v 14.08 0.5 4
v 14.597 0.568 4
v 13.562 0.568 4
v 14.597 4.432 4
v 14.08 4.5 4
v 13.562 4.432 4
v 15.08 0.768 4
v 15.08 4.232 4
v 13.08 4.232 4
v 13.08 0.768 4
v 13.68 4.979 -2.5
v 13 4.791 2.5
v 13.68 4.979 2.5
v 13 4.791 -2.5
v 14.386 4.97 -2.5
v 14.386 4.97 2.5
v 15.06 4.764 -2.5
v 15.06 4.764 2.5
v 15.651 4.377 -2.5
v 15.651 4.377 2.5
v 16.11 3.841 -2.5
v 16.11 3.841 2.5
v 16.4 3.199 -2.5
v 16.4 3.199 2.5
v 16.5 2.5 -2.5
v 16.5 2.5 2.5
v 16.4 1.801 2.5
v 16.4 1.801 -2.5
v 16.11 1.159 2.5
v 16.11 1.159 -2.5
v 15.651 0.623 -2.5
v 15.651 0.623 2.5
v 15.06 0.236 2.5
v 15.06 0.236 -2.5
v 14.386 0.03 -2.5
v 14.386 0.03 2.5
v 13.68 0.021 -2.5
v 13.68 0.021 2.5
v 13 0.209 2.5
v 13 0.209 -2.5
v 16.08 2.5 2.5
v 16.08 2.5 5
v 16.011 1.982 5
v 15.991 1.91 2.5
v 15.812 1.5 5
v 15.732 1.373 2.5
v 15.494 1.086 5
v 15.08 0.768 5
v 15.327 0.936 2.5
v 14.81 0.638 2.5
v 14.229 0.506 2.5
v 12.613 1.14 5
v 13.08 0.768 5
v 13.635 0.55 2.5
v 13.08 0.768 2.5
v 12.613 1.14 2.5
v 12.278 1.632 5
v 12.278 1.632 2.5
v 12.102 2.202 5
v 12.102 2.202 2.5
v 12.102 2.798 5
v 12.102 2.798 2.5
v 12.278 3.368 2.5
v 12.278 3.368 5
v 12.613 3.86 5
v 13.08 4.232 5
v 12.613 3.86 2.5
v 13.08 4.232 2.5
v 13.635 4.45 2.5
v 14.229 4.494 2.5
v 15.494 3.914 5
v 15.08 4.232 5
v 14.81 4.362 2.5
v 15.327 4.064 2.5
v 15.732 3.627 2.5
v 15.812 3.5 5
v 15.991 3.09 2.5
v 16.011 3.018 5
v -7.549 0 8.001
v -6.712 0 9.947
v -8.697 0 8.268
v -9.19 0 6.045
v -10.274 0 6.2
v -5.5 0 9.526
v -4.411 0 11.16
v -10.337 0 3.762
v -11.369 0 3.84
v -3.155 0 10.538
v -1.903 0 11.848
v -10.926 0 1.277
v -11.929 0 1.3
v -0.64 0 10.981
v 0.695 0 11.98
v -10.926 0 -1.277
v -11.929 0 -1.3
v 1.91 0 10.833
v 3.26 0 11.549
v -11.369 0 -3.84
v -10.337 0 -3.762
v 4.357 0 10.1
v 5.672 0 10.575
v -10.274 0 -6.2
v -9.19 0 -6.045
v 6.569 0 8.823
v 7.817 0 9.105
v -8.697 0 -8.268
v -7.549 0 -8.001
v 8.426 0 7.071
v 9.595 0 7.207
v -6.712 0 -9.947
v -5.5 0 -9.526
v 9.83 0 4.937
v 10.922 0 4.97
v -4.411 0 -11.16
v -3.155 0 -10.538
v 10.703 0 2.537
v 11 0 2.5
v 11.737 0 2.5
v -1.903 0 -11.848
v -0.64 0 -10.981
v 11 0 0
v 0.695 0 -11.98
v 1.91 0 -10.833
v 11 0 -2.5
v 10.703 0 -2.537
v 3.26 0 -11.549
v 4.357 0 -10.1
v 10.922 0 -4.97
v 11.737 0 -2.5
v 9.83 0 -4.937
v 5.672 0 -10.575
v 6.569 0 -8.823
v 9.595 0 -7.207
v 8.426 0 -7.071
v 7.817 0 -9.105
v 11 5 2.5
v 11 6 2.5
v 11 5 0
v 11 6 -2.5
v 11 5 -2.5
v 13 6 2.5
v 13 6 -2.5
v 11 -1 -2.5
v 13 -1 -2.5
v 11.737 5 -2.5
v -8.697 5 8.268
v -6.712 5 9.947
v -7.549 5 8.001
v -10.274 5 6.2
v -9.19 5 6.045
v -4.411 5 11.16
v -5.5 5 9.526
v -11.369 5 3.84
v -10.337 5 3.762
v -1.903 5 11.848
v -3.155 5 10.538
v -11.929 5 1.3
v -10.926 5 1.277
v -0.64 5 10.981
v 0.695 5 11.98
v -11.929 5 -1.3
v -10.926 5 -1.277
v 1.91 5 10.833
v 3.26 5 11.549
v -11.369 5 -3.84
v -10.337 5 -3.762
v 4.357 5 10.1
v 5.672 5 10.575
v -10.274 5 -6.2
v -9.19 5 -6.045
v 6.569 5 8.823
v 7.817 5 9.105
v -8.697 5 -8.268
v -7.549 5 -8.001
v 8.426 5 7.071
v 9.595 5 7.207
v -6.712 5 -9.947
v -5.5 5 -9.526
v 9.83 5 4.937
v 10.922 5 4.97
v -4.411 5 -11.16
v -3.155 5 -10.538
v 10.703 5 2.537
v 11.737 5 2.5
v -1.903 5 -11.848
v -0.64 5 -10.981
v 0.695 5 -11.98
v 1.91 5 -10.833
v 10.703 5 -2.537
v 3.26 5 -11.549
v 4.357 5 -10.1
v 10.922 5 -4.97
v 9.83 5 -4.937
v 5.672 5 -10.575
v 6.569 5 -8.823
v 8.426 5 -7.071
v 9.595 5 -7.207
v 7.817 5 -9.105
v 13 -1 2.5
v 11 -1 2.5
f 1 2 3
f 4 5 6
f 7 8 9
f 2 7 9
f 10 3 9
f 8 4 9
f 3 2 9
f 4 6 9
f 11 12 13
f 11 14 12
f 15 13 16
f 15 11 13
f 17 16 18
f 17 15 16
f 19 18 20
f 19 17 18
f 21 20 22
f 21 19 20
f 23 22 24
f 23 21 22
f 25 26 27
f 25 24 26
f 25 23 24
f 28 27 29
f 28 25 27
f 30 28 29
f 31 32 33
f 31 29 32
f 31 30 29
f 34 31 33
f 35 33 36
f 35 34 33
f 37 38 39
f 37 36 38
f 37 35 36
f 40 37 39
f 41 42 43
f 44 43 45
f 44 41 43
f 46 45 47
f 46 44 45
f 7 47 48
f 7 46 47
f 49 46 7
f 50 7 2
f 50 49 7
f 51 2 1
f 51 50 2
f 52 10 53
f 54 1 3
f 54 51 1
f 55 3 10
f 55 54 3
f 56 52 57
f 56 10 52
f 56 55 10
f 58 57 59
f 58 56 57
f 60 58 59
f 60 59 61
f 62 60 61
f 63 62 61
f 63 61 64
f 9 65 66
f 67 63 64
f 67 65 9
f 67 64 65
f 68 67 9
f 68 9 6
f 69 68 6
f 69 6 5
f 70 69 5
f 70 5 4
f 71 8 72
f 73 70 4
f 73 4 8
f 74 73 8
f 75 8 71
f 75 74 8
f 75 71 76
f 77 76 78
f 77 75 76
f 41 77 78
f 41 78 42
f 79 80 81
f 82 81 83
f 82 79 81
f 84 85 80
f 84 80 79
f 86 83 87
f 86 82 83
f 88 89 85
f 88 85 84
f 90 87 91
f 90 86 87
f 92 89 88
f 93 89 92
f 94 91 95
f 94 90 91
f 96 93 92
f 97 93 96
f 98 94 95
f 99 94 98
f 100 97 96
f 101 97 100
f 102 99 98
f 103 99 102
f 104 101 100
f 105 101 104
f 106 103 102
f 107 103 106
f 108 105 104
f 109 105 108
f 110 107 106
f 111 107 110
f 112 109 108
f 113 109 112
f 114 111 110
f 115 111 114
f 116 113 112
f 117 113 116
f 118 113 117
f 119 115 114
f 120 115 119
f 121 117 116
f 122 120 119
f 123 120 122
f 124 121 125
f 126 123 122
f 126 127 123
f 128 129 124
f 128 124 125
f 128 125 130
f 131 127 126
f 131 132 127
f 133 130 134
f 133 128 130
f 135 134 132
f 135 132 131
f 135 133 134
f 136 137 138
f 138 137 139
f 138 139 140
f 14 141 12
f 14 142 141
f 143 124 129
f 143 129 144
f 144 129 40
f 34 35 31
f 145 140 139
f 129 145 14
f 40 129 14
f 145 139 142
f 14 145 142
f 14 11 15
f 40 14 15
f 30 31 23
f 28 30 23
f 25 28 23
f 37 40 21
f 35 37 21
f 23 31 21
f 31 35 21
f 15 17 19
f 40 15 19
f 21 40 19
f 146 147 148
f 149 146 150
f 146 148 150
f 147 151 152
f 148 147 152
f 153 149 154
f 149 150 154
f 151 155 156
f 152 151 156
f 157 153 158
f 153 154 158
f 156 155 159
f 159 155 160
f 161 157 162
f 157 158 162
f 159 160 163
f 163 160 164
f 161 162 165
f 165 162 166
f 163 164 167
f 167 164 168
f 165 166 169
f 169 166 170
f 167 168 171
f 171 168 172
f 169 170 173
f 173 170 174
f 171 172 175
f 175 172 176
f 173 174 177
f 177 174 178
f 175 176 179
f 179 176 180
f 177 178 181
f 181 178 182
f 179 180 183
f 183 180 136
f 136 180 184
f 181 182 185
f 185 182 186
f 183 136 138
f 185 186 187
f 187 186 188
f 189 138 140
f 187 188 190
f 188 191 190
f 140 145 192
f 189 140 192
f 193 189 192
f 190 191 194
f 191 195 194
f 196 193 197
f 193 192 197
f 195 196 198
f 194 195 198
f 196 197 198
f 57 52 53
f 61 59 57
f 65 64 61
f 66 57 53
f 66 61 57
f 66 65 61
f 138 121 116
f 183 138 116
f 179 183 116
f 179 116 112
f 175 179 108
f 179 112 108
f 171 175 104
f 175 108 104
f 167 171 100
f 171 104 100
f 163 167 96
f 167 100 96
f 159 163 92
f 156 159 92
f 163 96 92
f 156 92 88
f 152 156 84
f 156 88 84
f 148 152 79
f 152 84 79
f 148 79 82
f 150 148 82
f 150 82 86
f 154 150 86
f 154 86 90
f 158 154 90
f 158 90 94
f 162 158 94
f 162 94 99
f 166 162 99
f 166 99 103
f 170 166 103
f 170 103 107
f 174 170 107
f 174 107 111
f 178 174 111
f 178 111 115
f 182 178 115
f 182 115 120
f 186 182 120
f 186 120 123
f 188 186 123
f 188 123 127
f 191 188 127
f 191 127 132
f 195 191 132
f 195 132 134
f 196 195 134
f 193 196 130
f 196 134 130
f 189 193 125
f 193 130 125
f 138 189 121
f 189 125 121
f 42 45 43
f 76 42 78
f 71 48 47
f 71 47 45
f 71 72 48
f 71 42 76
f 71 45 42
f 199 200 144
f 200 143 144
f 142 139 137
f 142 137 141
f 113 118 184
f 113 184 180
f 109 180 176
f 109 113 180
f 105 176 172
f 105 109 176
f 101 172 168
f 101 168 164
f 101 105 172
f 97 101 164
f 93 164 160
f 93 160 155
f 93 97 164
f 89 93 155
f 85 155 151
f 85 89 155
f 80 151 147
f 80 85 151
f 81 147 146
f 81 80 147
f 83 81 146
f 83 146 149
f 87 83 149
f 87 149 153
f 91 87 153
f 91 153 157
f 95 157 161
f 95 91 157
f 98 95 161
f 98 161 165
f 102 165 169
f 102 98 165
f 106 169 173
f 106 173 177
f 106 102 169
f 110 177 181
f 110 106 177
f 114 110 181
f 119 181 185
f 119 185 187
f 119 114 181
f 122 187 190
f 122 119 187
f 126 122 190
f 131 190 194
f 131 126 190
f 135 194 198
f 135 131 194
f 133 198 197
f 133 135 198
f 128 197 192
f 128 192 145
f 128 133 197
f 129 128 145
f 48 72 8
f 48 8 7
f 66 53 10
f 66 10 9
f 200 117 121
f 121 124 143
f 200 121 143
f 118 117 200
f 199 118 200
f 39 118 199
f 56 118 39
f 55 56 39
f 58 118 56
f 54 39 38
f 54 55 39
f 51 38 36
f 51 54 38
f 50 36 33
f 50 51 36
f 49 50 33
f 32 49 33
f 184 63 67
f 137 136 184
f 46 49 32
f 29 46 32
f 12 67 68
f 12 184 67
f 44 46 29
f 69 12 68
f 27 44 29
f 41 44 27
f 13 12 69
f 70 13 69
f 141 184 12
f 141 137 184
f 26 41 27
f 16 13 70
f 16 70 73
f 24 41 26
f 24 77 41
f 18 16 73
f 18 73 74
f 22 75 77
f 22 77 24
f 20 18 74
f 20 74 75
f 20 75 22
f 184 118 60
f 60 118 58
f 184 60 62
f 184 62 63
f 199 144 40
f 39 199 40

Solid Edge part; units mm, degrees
sketch "Sketch1" plane through (0, 0, 0) normal (0, -1, 0) x (1, 0, 0)
  circle A0 centre (0, 0) radius 12
  circle A1 centre (0, 0) radius 11
extrude "Protrusion1" add sketch "Sketch1" against normal blind 5
sketch "Sketch2" plane through (0, 0, 0) normal (0, 0, 1) x (1, 0, 0)
  line L0 (11, 6) -> (11, -1)
  line L1 (11, -1) -> (13, -1)
  line L2 (13, -1) -> (13, 0.2087)
  line L3 (13, 6) -> (13, 4.7913)
  line L4 (11, 6) -> (13, 6)
  arc A0 (13, 0.2087) -> (13, 4.7913) centre (14, 2.5) ccw
  dimension "D1" = 2
  dimension "D2" = 1
  dimension "D3" = 3
extrude "Protrusion2" add sketch "Sketch2" along normal mid plane 5
sketch "Sketch3" plane through (13.75, 2.5, 2.5) normal (0, 0, 1) x (1, 0, 0)
  circle A0 centre (0.3296, 0) radius 2
extrude "Protrusion3" add sketch "Sketch3" along normal mid plane 5
sketch "Sketch4" plane through (14.0796, 2.5, 5) normal (0, 0, 1) x (1, 0, 0)
  line L0 (-1, 2.5) -> (1, 2.5)
  line L1 (1, 2.5) -> (1, -2.5)
  line L2 (1, -2.5) -> (-1, -2.5)
  line L3 (-1, -2.5) -> (-1, 2.5)
  dimension "D1" = 5
  dimension "D2" = 2
extrude "ExtrudedCutout_1" cut sketch "Sketch4" against normal blind 1
properties material "Aluminum, 1350"
